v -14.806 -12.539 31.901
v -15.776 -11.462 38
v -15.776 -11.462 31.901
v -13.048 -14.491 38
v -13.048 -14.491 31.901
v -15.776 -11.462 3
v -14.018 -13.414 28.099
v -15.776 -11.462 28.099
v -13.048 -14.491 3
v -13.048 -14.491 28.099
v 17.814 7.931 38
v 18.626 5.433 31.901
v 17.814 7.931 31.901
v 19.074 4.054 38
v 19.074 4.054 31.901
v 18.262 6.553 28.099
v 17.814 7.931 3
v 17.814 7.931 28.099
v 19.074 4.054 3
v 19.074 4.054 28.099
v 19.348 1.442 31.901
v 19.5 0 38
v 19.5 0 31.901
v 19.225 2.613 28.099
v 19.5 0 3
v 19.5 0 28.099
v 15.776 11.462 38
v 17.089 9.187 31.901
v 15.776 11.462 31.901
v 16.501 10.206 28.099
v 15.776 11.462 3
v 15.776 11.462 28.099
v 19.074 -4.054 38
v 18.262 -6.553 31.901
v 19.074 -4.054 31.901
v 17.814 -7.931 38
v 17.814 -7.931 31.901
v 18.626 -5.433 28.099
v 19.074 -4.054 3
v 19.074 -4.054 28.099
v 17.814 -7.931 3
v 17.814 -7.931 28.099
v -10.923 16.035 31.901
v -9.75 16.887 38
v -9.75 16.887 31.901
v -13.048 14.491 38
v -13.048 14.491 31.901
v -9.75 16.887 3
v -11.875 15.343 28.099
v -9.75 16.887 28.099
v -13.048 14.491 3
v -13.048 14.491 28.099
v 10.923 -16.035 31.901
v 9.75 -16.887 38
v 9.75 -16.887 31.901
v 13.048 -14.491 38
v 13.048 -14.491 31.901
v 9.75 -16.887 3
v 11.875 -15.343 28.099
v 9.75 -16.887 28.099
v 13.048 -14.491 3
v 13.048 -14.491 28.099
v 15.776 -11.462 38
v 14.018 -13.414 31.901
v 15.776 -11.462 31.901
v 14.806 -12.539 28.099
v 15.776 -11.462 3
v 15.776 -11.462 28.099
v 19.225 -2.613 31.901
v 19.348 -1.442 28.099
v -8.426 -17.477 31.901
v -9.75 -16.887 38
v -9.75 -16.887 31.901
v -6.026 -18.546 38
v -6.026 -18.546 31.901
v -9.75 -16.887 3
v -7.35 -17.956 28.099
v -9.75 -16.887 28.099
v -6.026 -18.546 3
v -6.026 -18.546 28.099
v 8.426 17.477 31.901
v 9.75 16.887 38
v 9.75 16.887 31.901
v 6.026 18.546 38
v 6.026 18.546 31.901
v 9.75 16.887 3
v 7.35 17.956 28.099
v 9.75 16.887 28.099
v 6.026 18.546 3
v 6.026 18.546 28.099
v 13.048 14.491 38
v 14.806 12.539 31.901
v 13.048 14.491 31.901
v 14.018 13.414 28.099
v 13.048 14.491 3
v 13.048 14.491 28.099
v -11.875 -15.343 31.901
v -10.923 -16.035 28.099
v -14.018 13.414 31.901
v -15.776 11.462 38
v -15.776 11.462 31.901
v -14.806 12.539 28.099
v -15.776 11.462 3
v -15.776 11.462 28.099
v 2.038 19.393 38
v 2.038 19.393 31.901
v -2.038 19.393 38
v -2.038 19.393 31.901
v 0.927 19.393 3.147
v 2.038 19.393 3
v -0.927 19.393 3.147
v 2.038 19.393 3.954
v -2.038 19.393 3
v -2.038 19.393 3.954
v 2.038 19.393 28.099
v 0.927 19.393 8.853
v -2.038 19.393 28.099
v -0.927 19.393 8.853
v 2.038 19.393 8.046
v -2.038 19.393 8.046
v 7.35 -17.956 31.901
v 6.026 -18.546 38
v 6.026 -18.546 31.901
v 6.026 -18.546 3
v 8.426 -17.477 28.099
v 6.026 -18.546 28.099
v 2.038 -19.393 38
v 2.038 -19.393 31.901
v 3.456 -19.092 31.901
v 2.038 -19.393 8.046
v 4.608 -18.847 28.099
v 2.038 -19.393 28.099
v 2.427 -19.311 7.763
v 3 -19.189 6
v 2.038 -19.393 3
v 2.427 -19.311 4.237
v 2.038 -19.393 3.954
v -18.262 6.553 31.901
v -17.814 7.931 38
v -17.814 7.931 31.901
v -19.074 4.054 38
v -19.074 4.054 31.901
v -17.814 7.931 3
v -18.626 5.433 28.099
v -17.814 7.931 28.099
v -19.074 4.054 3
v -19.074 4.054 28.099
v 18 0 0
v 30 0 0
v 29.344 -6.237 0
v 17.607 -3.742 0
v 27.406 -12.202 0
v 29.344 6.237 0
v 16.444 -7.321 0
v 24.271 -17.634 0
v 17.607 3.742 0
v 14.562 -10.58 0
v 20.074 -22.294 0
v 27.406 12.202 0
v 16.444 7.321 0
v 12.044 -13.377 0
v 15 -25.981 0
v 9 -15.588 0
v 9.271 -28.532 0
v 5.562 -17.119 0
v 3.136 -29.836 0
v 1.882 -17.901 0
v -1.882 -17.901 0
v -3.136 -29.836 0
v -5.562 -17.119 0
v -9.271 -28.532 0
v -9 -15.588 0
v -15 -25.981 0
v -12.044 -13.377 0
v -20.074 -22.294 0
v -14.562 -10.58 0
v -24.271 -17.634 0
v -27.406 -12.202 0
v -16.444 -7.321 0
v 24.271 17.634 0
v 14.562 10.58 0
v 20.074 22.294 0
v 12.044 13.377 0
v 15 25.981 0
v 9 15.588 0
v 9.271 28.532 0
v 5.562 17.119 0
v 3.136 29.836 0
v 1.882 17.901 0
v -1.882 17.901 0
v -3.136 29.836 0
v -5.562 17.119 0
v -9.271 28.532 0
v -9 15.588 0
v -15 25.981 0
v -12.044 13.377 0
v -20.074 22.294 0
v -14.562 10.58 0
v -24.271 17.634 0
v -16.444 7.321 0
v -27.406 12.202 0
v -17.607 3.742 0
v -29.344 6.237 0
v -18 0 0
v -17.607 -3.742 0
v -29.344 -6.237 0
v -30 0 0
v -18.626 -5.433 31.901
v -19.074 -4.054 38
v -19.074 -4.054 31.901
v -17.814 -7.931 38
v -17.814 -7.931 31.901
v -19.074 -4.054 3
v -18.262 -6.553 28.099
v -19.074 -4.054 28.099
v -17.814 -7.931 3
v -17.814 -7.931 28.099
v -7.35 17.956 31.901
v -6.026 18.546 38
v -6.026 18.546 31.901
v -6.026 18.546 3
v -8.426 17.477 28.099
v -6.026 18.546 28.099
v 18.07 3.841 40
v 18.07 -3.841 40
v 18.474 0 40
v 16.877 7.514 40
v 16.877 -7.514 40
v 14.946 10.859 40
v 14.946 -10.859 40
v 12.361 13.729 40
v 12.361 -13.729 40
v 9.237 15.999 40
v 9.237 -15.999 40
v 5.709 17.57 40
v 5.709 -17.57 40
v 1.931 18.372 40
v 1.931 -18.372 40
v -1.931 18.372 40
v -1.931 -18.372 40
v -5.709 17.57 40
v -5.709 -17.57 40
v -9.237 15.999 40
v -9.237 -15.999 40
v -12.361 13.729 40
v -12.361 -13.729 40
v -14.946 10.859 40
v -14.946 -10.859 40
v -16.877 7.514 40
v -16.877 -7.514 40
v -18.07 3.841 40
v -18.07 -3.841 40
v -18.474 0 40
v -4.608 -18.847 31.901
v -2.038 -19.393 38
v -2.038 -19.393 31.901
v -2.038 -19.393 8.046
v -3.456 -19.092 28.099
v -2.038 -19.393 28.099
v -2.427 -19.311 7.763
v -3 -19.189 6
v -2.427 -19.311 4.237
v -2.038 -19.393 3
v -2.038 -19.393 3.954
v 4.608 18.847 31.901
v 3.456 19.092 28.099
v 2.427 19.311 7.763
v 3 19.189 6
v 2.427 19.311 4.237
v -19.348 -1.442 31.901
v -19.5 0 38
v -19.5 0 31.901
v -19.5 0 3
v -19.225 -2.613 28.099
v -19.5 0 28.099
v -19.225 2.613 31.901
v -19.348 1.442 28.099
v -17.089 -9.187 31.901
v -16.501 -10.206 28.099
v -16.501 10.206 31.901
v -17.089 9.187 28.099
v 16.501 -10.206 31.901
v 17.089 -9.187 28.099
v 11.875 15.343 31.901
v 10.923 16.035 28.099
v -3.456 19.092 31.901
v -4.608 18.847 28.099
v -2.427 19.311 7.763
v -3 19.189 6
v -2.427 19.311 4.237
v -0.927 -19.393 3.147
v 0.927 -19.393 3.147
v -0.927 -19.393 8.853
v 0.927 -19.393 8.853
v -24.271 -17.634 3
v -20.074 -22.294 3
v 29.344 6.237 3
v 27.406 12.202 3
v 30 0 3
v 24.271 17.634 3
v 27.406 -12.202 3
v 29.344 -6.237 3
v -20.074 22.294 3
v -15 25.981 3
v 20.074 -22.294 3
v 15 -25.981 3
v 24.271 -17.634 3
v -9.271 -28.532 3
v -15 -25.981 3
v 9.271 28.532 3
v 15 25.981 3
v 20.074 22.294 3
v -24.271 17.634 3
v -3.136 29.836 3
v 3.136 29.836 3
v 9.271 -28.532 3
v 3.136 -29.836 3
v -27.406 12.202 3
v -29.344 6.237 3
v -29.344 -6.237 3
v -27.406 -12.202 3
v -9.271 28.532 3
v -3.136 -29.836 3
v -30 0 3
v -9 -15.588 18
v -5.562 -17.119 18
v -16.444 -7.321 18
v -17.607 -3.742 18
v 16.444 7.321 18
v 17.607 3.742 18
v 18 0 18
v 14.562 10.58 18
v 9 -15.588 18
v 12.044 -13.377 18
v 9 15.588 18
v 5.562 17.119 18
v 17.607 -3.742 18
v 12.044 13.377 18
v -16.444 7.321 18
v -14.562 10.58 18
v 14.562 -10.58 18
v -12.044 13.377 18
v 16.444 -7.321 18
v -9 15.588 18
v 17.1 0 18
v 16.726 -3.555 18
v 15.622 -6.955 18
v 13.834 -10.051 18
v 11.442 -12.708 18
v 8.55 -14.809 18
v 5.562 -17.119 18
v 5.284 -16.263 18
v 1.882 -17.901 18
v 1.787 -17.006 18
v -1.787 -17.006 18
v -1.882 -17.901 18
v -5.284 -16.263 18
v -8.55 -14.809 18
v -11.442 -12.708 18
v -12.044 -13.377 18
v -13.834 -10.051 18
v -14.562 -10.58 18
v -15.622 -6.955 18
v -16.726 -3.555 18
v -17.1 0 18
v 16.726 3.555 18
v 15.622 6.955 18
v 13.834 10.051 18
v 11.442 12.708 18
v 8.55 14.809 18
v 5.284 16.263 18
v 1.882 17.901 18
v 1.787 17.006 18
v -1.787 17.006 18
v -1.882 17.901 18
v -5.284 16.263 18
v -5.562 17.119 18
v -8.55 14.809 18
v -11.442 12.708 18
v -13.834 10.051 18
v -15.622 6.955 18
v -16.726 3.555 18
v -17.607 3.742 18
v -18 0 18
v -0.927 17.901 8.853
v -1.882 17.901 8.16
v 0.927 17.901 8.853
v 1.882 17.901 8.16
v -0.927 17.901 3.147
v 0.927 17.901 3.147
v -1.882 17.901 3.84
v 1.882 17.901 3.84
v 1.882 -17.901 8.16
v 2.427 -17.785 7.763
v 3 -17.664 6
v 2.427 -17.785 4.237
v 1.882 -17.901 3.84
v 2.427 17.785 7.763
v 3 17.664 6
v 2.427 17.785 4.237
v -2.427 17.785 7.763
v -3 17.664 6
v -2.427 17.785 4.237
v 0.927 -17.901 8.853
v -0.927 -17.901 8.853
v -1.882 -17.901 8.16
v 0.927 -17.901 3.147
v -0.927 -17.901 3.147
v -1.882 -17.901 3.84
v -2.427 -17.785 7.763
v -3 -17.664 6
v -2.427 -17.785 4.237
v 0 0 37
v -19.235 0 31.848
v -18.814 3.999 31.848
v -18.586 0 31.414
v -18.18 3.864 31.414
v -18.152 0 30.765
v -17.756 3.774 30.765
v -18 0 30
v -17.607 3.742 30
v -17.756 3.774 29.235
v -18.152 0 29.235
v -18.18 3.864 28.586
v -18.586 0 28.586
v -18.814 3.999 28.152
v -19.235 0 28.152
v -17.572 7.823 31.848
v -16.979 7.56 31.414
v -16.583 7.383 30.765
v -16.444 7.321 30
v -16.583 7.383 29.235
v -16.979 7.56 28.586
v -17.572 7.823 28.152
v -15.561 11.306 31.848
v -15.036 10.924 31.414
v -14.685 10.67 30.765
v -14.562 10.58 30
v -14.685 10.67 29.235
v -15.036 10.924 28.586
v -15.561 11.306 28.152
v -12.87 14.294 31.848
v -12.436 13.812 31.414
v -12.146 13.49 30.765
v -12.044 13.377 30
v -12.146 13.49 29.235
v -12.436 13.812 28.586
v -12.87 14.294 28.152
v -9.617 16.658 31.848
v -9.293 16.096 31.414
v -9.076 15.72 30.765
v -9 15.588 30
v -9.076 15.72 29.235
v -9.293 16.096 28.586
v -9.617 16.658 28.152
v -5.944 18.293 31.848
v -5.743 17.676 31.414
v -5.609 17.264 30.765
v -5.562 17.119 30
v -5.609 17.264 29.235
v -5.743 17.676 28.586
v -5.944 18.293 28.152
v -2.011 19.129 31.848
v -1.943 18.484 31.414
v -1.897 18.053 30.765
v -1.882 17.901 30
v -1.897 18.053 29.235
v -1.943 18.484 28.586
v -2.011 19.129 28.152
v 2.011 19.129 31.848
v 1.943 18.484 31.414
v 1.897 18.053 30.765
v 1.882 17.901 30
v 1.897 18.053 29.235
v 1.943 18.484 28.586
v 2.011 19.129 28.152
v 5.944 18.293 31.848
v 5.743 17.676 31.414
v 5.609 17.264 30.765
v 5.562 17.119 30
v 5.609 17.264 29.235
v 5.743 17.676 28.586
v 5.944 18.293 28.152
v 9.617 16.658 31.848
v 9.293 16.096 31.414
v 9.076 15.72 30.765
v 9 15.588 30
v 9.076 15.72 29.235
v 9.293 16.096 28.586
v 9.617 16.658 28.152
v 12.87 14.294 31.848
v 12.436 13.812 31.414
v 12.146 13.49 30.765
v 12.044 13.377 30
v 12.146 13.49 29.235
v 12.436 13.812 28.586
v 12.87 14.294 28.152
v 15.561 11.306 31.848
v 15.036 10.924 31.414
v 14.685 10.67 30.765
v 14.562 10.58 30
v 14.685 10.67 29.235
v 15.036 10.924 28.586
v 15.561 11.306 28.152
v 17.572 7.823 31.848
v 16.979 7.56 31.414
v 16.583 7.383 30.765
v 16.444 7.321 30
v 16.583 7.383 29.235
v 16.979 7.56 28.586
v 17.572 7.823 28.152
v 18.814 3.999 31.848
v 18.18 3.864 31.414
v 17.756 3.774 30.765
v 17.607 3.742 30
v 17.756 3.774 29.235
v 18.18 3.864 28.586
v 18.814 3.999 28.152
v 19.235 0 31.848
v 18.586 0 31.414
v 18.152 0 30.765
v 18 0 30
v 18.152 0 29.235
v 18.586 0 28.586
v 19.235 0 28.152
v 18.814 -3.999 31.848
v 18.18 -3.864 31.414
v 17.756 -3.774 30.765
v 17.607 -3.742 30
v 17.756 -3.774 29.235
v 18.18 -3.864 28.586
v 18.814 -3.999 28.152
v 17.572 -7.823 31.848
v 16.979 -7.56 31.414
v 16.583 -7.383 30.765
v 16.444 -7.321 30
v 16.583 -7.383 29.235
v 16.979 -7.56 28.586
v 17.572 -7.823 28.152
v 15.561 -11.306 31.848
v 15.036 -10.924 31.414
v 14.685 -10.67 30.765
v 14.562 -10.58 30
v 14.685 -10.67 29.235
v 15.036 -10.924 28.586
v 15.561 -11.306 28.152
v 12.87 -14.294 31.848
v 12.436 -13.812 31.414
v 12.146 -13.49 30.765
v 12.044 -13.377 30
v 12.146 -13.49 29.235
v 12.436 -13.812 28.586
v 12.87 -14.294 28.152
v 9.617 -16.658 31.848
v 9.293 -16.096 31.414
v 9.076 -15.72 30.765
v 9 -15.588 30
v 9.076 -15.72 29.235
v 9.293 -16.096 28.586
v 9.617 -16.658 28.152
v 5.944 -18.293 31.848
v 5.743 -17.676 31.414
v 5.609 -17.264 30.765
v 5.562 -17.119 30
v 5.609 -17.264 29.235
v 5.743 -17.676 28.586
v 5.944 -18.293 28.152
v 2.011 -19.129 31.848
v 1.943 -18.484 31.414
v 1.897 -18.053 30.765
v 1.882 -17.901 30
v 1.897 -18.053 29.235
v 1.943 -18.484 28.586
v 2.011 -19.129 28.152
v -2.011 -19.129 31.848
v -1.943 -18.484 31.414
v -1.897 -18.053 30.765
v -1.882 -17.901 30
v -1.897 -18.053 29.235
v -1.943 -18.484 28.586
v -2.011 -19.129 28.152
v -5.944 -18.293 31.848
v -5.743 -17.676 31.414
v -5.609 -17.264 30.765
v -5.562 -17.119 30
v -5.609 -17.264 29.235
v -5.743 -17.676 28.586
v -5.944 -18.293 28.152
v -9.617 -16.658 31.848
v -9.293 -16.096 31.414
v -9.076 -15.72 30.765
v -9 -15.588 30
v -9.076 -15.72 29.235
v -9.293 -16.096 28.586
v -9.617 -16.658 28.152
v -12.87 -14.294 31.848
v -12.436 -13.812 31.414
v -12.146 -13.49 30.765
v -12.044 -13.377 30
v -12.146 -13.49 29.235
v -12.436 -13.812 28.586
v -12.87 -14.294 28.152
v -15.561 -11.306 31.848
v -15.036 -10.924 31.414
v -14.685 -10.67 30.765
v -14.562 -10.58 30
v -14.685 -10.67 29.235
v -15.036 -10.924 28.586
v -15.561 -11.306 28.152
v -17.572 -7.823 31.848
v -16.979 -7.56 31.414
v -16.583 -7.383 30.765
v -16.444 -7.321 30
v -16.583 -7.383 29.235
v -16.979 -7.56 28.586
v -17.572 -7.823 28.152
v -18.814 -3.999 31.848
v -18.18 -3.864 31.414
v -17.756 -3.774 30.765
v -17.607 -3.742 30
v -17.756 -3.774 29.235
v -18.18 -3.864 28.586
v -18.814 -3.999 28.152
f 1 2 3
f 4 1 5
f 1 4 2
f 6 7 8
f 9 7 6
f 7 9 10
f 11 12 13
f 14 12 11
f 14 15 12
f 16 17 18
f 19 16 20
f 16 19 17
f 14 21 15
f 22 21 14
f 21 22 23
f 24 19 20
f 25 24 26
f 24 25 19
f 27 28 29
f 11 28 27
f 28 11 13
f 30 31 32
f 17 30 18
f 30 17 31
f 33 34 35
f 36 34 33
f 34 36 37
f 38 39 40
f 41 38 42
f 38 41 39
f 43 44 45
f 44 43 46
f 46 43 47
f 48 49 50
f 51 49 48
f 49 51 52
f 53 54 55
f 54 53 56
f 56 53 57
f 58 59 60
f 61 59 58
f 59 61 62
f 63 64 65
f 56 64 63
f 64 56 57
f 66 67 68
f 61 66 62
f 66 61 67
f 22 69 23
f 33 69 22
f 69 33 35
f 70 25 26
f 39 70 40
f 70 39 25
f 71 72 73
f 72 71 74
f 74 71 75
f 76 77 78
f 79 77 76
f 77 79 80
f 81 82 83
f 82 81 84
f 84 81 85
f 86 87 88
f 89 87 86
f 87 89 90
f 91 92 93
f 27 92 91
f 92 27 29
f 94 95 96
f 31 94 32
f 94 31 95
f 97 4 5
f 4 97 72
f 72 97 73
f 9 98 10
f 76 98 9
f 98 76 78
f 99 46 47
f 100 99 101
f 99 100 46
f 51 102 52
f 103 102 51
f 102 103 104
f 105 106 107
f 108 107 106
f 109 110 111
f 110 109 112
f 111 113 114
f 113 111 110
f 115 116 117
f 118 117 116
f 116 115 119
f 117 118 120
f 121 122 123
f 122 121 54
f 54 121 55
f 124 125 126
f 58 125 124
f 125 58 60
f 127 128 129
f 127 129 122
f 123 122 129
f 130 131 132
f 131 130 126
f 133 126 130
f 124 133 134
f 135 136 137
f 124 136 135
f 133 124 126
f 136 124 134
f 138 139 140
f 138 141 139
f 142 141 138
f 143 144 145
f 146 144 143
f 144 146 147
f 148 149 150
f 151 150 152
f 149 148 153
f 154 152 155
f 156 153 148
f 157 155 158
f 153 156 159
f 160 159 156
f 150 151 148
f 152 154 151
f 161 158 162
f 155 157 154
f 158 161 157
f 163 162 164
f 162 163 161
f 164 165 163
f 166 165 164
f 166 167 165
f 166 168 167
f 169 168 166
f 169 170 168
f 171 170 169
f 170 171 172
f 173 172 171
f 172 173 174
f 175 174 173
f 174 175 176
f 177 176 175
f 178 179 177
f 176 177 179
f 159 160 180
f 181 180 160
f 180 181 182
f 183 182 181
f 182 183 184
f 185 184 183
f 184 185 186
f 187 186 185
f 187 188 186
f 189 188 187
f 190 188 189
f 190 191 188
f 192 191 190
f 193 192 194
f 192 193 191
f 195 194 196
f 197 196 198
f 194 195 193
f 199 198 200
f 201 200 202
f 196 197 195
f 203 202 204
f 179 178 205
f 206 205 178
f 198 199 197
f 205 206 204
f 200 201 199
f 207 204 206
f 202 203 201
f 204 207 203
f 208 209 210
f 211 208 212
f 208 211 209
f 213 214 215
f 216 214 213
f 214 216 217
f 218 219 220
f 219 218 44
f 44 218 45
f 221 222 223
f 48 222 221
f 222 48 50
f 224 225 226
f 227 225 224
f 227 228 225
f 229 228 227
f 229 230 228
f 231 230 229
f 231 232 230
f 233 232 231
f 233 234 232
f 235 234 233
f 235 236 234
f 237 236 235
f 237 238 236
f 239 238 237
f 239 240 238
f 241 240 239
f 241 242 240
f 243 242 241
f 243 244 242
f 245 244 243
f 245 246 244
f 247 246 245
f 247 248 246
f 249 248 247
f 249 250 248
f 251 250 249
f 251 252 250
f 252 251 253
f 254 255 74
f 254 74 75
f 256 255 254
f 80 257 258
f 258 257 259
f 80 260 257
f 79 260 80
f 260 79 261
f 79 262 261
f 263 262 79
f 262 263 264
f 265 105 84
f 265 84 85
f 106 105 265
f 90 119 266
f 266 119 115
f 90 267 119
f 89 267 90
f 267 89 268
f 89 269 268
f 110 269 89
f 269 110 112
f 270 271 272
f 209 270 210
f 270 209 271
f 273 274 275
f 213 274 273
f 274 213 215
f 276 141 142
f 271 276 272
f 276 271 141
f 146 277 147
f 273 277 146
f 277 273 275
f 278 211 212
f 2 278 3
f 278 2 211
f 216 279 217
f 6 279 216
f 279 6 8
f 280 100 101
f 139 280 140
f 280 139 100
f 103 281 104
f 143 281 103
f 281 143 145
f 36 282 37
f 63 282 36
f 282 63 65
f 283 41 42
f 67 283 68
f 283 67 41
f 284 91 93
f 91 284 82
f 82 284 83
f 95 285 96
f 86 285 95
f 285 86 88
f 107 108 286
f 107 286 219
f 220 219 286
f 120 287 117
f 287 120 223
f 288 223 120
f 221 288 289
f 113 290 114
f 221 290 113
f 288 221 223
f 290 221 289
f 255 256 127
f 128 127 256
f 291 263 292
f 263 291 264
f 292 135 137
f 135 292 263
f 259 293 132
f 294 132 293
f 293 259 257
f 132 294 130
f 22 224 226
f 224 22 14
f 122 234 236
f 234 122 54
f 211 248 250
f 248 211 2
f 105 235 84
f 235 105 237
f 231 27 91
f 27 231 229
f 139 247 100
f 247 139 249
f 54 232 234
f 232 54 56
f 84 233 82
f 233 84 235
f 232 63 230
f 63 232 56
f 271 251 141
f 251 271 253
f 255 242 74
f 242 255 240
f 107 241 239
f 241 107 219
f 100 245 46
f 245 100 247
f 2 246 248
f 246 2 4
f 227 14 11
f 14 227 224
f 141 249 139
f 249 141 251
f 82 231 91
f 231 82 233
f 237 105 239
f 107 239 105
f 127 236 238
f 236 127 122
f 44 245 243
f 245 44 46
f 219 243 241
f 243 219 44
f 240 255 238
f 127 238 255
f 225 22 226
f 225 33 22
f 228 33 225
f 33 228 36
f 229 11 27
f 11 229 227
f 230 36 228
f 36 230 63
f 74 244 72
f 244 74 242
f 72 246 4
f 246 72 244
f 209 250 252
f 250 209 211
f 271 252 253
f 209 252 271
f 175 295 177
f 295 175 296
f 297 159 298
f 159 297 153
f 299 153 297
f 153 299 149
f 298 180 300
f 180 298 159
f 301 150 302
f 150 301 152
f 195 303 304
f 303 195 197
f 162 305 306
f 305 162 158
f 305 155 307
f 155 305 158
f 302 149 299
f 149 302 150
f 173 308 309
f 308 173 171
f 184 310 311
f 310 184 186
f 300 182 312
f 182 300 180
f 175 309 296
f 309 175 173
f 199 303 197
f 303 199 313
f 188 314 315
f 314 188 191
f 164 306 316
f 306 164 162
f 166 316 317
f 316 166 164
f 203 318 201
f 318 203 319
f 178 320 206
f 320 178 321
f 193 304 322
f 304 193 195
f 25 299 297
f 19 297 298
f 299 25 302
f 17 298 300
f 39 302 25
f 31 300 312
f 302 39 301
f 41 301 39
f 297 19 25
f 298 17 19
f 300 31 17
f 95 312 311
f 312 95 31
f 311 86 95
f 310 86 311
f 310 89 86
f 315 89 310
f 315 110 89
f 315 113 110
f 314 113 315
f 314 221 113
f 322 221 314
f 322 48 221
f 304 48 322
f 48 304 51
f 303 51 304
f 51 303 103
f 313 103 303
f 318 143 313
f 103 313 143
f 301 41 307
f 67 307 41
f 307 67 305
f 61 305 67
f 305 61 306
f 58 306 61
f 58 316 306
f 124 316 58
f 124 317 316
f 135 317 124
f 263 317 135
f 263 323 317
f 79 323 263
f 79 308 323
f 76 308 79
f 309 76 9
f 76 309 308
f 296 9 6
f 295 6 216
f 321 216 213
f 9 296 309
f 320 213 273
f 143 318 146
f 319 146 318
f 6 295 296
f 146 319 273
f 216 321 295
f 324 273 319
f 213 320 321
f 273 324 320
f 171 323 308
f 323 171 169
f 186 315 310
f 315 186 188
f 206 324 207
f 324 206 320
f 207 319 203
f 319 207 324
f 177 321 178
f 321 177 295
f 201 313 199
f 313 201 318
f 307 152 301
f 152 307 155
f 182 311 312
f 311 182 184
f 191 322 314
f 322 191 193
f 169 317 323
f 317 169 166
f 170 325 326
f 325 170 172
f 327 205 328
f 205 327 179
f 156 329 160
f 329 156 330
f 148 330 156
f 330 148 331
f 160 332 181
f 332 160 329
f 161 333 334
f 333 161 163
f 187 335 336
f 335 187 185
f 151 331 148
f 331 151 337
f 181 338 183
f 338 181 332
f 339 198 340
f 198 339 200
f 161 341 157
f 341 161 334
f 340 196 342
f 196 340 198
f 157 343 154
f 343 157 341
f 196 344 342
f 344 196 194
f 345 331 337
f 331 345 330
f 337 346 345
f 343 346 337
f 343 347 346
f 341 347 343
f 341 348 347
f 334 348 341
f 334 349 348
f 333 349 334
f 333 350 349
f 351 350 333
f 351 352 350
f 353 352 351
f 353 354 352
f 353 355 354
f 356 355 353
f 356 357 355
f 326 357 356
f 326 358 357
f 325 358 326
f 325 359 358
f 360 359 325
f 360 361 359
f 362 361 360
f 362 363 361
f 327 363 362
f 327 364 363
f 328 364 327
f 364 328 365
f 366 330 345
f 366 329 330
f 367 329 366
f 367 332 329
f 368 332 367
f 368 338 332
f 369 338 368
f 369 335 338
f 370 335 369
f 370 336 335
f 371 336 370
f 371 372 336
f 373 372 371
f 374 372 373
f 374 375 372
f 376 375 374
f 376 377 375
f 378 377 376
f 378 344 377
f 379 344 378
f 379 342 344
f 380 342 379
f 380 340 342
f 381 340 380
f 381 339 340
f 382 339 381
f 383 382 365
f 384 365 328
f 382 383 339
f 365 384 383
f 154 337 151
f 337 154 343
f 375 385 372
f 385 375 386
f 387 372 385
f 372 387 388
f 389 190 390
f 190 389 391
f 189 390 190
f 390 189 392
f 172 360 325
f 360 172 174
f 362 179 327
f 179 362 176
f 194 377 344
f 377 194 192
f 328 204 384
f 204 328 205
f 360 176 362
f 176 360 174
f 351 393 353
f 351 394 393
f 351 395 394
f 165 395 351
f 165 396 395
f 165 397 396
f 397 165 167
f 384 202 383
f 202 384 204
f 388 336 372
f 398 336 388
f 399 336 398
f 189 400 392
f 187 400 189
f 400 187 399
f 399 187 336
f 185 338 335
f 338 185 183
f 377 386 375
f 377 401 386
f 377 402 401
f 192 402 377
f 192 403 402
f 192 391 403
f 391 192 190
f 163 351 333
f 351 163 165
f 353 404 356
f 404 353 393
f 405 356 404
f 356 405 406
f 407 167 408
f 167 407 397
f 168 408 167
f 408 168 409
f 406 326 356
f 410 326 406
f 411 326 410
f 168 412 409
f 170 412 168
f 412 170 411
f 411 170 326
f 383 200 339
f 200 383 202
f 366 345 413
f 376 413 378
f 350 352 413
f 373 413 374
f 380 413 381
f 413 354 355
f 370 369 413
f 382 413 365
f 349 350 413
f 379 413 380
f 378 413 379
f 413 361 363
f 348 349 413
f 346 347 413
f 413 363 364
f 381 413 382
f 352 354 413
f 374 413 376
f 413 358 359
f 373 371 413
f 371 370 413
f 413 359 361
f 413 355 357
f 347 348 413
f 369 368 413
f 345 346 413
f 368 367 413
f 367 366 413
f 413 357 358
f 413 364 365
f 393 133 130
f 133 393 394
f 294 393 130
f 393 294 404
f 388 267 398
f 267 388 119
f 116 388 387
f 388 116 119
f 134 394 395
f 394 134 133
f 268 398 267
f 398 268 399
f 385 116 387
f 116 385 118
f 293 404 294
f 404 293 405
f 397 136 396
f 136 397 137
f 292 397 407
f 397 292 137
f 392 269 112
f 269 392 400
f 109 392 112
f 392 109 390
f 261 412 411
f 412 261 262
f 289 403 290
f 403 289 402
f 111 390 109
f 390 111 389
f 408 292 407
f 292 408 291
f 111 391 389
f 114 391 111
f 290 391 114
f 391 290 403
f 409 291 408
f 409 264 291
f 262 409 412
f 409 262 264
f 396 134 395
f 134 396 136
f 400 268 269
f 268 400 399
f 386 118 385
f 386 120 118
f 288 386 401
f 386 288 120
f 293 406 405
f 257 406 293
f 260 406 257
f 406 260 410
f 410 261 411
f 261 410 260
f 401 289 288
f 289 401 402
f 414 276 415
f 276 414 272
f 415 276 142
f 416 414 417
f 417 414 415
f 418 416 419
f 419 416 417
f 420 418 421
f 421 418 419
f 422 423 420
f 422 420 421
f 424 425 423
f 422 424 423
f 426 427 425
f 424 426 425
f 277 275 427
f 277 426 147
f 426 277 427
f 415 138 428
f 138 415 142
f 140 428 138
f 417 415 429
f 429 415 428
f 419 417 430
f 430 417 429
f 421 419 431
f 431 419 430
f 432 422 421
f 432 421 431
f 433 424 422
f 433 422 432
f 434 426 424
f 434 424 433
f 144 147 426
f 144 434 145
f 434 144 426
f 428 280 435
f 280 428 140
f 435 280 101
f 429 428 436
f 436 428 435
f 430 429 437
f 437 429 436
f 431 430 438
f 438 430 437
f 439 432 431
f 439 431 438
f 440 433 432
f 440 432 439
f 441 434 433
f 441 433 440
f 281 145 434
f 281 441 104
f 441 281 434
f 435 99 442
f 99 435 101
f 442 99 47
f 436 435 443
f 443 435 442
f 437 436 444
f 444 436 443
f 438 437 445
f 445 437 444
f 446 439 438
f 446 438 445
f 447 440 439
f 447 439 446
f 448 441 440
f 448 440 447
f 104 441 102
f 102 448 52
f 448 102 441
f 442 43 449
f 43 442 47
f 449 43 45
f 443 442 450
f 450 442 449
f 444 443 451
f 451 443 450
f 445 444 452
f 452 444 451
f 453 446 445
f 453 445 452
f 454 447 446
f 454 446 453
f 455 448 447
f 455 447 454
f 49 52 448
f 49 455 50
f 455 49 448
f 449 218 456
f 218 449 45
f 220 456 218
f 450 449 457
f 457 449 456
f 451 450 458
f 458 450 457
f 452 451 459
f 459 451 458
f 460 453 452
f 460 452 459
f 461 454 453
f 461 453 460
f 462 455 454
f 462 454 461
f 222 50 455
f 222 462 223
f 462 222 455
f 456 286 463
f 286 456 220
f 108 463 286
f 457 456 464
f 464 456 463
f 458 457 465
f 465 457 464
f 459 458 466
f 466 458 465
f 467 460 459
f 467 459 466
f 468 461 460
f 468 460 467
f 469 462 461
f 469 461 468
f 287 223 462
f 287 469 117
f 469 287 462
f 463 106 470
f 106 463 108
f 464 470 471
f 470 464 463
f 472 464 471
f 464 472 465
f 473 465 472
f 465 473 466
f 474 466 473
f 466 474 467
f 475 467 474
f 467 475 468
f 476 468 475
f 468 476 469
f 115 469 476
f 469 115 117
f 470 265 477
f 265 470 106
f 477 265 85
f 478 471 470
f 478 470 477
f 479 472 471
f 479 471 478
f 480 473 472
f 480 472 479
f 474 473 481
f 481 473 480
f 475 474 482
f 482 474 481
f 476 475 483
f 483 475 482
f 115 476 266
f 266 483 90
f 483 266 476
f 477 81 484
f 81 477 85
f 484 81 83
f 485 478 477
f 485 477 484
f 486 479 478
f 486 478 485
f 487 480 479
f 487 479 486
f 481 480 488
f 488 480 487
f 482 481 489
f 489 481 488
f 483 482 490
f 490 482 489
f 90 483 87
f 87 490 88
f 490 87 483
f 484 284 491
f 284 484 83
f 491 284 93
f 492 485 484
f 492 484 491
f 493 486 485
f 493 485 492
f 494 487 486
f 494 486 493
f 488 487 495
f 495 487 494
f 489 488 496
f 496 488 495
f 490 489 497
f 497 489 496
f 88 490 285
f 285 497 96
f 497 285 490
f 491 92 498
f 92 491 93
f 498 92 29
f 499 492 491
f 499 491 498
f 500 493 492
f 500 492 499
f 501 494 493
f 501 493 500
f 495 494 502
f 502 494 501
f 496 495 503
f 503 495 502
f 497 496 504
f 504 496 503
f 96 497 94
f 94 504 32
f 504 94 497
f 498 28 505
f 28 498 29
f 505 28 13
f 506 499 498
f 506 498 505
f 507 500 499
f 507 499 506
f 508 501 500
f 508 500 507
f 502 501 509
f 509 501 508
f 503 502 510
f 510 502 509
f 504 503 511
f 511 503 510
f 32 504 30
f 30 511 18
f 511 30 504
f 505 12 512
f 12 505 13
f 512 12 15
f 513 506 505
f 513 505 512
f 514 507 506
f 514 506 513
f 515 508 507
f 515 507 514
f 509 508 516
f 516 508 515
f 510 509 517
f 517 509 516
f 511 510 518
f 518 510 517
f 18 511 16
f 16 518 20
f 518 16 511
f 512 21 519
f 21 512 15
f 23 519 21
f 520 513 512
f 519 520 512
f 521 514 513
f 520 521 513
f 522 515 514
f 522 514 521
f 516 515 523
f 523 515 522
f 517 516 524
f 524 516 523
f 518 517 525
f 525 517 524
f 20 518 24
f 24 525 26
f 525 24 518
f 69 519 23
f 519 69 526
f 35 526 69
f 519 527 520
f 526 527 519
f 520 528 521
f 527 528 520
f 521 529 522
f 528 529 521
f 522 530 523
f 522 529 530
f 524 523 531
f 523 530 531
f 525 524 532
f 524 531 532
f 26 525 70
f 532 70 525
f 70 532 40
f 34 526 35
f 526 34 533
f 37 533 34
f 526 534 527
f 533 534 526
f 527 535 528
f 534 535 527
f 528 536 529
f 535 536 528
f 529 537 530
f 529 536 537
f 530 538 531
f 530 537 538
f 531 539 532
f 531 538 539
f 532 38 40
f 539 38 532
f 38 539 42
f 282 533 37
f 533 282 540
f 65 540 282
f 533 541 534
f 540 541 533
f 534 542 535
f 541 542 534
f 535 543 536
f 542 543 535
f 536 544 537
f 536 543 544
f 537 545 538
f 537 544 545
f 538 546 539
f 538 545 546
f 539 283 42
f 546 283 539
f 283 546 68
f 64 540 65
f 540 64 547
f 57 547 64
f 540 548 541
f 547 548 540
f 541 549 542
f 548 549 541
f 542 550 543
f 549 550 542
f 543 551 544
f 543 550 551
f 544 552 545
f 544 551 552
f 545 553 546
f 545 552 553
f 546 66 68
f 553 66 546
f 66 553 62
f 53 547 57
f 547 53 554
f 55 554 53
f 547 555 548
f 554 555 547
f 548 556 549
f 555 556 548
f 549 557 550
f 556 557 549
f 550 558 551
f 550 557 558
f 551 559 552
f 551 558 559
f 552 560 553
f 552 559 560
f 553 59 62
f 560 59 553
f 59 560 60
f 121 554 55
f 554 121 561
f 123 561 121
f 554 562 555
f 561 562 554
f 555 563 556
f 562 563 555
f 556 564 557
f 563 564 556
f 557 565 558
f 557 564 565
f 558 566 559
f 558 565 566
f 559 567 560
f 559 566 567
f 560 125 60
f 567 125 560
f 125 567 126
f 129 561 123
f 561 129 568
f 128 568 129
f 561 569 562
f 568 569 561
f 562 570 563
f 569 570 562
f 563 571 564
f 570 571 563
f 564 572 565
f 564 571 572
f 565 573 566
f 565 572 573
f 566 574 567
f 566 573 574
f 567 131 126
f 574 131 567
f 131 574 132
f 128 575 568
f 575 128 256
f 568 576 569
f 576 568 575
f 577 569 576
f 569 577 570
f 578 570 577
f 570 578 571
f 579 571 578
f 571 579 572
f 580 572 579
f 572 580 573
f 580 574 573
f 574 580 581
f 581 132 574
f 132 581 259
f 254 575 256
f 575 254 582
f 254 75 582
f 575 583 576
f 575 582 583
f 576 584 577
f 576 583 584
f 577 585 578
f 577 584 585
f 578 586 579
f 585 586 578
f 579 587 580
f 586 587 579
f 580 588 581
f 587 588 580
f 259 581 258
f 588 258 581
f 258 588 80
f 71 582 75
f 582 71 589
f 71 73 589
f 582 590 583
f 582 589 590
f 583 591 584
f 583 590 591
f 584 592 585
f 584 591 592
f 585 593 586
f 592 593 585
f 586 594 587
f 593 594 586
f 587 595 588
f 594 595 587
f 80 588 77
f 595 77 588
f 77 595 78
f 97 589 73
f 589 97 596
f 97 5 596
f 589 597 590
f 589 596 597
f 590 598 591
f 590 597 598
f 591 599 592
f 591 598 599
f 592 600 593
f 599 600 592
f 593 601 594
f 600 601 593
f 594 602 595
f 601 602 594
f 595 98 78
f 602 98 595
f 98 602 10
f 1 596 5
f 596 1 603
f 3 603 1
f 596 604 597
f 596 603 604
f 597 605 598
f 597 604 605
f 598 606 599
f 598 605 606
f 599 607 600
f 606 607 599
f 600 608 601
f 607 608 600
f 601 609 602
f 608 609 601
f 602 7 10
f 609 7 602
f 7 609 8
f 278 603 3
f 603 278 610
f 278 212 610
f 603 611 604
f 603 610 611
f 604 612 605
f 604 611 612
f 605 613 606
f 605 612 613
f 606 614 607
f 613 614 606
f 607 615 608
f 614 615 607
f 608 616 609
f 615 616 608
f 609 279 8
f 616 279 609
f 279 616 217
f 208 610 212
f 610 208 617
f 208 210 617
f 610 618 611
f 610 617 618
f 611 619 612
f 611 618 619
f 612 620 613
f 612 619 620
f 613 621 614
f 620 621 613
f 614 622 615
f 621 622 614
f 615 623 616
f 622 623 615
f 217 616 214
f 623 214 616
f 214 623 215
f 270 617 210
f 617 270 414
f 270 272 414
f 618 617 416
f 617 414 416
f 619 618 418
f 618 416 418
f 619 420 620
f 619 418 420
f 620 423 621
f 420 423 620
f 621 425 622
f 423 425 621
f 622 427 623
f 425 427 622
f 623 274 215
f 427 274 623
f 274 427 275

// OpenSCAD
pipe_id = 40;

//translate([0,0,pipe_id/2])
//cylinder(h=pipe_id/2, d1=pipe_id-4, d2=0);

difference () {
    union () {
        intersection () {
            cylinder(h=pipe_id, d=pipe_id-1);
            translate([0,pipe_id/2,6])
                rotate([90,0,0])
                    cylinder(h=pipe_id, d=12);
                      translate([0,0,pipe_id-2]) cylinder(h=pipe_id/2, d1=pipe_id, d2=0);
      
        }

        difference () {
            union () {
                intersection () {
                    // main cylinder with taper on end
                    cylinder(h=pipe_id, d=pipe_id - 1);
                    cylinder(h=pipe_id*2-4, r1=pipe_id-1, d2=0);
                }
                cylinder(h=3, d=pipe_id+20);
            }
            union () {
                translate([0,0,-2]) cylinder(h=pipe_id/2, d=pipe_id - 4);
                translate([0,0,pipe_id/2-3]) cylinder(h=pipe_id/2, d1=pipe_id-4, d2=0);
            }
        }
    }
    translate([0, pipe_id/2, 6])
        rotate([90,0,0])
            cylinder(h=pipe_id+2, d=6);


rotate_extrude(angle=360, convexity=10) {
translate([pipe_id/2, pipe_id*3/4, 0]) circle(d=4, $fn=16);
}}
